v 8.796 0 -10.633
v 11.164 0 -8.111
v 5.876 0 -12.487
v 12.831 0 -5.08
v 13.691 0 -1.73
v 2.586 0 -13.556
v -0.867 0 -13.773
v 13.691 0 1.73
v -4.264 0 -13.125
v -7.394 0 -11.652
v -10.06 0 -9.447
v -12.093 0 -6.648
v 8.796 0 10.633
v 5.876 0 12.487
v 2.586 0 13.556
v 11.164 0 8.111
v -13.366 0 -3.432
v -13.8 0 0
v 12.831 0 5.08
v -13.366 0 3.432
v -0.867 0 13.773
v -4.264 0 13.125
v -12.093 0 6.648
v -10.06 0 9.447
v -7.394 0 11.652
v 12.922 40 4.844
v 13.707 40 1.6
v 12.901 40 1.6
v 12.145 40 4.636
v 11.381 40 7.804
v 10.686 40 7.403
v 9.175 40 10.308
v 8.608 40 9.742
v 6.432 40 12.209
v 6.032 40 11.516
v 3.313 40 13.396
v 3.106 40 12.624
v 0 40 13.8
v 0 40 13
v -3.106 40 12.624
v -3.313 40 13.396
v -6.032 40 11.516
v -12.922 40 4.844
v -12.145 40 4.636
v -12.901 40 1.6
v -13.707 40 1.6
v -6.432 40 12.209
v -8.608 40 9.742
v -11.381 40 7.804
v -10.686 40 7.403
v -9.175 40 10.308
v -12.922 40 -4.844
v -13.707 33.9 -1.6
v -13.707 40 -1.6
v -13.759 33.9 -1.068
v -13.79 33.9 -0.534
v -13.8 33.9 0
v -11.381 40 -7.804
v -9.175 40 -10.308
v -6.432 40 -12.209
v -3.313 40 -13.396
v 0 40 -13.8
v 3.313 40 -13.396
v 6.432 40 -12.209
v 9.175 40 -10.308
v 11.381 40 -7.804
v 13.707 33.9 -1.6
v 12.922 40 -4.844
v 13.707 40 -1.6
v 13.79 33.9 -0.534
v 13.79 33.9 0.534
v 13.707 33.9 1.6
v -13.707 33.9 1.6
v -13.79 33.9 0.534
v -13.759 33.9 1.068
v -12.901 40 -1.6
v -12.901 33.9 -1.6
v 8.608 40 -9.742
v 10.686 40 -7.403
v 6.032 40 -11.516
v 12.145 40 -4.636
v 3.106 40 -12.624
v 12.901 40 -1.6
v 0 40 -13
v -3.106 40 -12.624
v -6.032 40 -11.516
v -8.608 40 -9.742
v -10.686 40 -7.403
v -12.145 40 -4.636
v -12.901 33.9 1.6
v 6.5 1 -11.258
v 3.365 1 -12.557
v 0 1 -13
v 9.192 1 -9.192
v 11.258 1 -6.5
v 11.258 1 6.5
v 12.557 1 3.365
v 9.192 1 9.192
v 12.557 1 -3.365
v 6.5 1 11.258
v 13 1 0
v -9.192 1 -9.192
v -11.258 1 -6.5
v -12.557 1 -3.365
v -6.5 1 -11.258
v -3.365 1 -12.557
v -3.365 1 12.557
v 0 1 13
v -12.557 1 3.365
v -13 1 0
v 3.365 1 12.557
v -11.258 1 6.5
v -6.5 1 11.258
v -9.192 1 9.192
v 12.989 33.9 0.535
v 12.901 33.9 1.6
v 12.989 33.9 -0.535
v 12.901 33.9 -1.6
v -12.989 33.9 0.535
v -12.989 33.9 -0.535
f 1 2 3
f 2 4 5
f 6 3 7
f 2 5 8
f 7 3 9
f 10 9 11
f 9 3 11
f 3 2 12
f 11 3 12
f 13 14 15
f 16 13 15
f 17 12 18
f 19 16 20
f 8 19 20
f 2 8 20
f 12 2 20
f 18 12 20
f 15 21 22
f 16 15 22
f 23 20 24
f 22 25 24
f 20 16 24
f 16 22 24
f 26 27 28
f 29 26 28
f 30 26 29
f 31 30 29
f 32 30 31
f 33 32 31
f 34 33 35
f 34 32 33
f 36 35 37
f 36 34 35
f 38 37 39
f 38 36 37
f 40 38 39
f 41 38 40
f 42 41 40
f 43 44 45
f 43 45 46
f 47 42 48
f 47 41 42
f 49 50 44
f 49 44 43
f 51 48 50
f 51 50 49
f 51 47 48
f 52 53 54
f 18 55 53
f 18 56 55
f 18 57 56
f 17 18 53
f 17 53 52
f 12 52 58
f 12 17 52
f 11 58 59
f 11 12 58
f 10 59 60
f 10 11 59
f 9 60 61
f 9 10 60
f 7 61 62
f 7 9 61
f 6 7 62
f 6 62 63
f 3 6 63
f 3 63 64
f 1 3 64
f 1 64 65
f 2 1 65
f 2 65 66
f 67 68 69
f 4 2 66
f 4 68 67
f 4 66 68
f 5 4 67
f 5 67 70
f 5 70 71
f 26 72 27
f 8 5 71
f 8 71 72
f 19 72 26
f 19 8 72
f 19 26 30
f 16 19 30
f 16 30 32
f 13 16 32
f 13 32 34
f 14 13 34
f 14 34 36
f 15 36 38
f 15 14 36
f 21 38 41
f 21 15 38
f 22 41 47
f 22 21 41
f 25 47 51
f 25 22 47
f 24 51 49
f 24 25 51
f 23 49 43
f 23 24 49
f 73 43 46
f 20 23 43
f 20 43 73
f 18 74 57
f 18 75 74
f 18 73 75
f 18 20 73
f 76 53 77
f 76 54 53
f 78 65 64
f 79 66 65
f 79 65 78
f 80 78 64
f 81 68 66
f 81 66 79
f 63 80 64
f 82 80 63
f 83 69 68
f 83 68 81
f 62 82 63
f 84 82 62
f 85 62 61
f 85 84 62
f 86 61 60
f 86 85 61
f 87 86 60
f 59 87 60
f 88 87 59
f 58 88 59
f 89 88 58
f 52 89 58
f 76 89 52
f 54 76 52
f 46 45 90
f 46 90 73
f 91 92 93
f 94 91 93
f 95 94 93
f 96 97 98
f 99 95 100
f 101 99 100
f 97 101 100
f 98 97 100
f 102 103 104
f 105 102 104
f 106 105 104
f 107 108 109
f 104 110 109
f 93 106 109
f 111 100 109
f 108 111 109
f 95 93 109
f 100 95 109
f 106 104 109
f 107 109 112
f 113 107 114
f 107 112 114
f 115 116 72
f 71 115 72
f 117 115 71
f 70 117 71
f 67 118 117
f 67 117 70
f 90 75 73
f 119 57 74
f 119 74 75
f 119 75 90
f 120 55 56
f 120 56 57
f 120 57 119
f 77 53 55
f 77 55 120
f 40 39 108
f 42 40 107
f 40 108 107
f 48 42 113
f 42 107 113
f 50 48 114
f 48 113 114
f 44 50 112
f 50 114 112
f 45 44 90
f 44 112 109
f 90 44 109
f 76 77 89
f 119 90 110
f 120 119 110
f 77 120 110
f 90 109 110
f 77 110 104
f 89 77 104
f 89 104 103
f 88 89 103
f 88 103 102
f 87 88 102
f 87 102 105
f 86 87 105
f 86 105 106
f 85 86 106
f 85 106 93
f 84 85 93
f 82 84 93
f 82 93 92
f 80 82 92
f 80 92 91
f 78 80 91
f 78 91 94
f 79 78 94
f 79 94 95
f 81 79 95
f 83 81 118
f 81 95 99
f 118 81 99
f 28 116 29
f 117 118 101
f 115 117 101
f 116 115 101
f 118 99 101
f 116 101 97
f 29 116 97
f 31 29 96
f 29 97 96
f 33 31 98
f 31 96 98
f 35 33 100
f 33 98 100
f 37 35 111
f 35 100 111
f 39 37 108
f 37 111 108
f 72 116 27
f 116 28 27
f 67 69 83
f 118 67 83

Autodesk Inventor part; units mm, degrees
ref_plane "YZ Plane" through (0, 0, 0) normal (1, 0, 0) x (0, 1, 0)
ref_plane "XZ Plane" through (0, 0, 0) normal (0, 1, 0) x (-1, 0, 0)
ref_plane "XY Plane" through (0, 0, 0) normal (0, 0, 1) x (1, 0, 0)
sketch "Sketch2" plane through (0, 0, 0) normal (0, 1, 0) x (-1, 0, 0)
  circle A0 centre (0, 0) radius 13.8
  line L0 (0, -13.8) -> (0, -13)
  dimension "d0" = 27.6
  dimension "d79" = 0.8
extrude "Extrusion1" add sketch "Sketch2" along normal blind 40
sketch "Sketch3" plane through (0, 40, 0) normal (0, 1, 0) x (1, 0, 0)
  circle A0 centre (0, 0) radius 13
  dimension "d3" = 26
hole "Hole1" at (0, 40, 0) direction (0, -1, 0) diameter 26 depth 39
sketch "Sketch8" plane through (0, 40, 0) normal (0, 1, 0) x (1, 0, 0)
  circle A0 centre (0, 0) radius 13.8 projected
  line L0 (-13.8, 0) -> (-13.8, 1.6)
  line L1 (-13.8, 0) -> (-12.2, 0) construction
  line L2 (-13.8, 1.6) -> (-10.8, 1.6)
  line L3 (-10.8, 1.6) -> (-10.8, -1.6)
  line L4 (-10.8, -1.6) -> (-13.8, -1.6)
  line L5 (-13.8, -1.6) -> (-13.8, 0)
  point P0 (-13.7069, 1.6)
  point P1 (-13.7069, -1.6)
  dimension "d64" = 1.6
  dimension "d66" = 3
  dimension "d67" = 3.2
  dimension "d69" = 3
extrude "Extrusion6" cut sketch "Sketch8" against normal blind 6.1 contours L2 L3 L4 A0 picked at (-11.8, 0)
sketch "Sketch9" plane through (0, 40, 0) normal (0, 1, 0) x (1, 0, 0)
  circle A0 centre (0, 0) radius 13.8 projected
  line L0 (13.8, 0) -> (13.8, 1.6)
  line L1 (13.8, 0) -> (15.4, 0) construction
  line L2 (13.8, 1.6) -> (10.8, 1.6)
  line L3 (10.8, 1.6) -> (10.8, -1.6)
  line L4 (10.8, -1.6) -> (13.8, -1.6)
  line L5 (13.8, -1.6) -> (13.8, 0)
  point P0 (13.7069, -1.6)
  point P1 (13.7069, 1.6)
  dimension "d72" = 1.6
  dimension "d74" = 3
  dimension "d75" = 3.2
  dimension "d76" = 3
extrude "Extrusion7" cut sketch "Sketch9" against normal blind 6.1 contours A0 L4 L3 L2 picked at (11.8, 0)
properties part number "Part6_containter_top" material "ABS Plastic"
